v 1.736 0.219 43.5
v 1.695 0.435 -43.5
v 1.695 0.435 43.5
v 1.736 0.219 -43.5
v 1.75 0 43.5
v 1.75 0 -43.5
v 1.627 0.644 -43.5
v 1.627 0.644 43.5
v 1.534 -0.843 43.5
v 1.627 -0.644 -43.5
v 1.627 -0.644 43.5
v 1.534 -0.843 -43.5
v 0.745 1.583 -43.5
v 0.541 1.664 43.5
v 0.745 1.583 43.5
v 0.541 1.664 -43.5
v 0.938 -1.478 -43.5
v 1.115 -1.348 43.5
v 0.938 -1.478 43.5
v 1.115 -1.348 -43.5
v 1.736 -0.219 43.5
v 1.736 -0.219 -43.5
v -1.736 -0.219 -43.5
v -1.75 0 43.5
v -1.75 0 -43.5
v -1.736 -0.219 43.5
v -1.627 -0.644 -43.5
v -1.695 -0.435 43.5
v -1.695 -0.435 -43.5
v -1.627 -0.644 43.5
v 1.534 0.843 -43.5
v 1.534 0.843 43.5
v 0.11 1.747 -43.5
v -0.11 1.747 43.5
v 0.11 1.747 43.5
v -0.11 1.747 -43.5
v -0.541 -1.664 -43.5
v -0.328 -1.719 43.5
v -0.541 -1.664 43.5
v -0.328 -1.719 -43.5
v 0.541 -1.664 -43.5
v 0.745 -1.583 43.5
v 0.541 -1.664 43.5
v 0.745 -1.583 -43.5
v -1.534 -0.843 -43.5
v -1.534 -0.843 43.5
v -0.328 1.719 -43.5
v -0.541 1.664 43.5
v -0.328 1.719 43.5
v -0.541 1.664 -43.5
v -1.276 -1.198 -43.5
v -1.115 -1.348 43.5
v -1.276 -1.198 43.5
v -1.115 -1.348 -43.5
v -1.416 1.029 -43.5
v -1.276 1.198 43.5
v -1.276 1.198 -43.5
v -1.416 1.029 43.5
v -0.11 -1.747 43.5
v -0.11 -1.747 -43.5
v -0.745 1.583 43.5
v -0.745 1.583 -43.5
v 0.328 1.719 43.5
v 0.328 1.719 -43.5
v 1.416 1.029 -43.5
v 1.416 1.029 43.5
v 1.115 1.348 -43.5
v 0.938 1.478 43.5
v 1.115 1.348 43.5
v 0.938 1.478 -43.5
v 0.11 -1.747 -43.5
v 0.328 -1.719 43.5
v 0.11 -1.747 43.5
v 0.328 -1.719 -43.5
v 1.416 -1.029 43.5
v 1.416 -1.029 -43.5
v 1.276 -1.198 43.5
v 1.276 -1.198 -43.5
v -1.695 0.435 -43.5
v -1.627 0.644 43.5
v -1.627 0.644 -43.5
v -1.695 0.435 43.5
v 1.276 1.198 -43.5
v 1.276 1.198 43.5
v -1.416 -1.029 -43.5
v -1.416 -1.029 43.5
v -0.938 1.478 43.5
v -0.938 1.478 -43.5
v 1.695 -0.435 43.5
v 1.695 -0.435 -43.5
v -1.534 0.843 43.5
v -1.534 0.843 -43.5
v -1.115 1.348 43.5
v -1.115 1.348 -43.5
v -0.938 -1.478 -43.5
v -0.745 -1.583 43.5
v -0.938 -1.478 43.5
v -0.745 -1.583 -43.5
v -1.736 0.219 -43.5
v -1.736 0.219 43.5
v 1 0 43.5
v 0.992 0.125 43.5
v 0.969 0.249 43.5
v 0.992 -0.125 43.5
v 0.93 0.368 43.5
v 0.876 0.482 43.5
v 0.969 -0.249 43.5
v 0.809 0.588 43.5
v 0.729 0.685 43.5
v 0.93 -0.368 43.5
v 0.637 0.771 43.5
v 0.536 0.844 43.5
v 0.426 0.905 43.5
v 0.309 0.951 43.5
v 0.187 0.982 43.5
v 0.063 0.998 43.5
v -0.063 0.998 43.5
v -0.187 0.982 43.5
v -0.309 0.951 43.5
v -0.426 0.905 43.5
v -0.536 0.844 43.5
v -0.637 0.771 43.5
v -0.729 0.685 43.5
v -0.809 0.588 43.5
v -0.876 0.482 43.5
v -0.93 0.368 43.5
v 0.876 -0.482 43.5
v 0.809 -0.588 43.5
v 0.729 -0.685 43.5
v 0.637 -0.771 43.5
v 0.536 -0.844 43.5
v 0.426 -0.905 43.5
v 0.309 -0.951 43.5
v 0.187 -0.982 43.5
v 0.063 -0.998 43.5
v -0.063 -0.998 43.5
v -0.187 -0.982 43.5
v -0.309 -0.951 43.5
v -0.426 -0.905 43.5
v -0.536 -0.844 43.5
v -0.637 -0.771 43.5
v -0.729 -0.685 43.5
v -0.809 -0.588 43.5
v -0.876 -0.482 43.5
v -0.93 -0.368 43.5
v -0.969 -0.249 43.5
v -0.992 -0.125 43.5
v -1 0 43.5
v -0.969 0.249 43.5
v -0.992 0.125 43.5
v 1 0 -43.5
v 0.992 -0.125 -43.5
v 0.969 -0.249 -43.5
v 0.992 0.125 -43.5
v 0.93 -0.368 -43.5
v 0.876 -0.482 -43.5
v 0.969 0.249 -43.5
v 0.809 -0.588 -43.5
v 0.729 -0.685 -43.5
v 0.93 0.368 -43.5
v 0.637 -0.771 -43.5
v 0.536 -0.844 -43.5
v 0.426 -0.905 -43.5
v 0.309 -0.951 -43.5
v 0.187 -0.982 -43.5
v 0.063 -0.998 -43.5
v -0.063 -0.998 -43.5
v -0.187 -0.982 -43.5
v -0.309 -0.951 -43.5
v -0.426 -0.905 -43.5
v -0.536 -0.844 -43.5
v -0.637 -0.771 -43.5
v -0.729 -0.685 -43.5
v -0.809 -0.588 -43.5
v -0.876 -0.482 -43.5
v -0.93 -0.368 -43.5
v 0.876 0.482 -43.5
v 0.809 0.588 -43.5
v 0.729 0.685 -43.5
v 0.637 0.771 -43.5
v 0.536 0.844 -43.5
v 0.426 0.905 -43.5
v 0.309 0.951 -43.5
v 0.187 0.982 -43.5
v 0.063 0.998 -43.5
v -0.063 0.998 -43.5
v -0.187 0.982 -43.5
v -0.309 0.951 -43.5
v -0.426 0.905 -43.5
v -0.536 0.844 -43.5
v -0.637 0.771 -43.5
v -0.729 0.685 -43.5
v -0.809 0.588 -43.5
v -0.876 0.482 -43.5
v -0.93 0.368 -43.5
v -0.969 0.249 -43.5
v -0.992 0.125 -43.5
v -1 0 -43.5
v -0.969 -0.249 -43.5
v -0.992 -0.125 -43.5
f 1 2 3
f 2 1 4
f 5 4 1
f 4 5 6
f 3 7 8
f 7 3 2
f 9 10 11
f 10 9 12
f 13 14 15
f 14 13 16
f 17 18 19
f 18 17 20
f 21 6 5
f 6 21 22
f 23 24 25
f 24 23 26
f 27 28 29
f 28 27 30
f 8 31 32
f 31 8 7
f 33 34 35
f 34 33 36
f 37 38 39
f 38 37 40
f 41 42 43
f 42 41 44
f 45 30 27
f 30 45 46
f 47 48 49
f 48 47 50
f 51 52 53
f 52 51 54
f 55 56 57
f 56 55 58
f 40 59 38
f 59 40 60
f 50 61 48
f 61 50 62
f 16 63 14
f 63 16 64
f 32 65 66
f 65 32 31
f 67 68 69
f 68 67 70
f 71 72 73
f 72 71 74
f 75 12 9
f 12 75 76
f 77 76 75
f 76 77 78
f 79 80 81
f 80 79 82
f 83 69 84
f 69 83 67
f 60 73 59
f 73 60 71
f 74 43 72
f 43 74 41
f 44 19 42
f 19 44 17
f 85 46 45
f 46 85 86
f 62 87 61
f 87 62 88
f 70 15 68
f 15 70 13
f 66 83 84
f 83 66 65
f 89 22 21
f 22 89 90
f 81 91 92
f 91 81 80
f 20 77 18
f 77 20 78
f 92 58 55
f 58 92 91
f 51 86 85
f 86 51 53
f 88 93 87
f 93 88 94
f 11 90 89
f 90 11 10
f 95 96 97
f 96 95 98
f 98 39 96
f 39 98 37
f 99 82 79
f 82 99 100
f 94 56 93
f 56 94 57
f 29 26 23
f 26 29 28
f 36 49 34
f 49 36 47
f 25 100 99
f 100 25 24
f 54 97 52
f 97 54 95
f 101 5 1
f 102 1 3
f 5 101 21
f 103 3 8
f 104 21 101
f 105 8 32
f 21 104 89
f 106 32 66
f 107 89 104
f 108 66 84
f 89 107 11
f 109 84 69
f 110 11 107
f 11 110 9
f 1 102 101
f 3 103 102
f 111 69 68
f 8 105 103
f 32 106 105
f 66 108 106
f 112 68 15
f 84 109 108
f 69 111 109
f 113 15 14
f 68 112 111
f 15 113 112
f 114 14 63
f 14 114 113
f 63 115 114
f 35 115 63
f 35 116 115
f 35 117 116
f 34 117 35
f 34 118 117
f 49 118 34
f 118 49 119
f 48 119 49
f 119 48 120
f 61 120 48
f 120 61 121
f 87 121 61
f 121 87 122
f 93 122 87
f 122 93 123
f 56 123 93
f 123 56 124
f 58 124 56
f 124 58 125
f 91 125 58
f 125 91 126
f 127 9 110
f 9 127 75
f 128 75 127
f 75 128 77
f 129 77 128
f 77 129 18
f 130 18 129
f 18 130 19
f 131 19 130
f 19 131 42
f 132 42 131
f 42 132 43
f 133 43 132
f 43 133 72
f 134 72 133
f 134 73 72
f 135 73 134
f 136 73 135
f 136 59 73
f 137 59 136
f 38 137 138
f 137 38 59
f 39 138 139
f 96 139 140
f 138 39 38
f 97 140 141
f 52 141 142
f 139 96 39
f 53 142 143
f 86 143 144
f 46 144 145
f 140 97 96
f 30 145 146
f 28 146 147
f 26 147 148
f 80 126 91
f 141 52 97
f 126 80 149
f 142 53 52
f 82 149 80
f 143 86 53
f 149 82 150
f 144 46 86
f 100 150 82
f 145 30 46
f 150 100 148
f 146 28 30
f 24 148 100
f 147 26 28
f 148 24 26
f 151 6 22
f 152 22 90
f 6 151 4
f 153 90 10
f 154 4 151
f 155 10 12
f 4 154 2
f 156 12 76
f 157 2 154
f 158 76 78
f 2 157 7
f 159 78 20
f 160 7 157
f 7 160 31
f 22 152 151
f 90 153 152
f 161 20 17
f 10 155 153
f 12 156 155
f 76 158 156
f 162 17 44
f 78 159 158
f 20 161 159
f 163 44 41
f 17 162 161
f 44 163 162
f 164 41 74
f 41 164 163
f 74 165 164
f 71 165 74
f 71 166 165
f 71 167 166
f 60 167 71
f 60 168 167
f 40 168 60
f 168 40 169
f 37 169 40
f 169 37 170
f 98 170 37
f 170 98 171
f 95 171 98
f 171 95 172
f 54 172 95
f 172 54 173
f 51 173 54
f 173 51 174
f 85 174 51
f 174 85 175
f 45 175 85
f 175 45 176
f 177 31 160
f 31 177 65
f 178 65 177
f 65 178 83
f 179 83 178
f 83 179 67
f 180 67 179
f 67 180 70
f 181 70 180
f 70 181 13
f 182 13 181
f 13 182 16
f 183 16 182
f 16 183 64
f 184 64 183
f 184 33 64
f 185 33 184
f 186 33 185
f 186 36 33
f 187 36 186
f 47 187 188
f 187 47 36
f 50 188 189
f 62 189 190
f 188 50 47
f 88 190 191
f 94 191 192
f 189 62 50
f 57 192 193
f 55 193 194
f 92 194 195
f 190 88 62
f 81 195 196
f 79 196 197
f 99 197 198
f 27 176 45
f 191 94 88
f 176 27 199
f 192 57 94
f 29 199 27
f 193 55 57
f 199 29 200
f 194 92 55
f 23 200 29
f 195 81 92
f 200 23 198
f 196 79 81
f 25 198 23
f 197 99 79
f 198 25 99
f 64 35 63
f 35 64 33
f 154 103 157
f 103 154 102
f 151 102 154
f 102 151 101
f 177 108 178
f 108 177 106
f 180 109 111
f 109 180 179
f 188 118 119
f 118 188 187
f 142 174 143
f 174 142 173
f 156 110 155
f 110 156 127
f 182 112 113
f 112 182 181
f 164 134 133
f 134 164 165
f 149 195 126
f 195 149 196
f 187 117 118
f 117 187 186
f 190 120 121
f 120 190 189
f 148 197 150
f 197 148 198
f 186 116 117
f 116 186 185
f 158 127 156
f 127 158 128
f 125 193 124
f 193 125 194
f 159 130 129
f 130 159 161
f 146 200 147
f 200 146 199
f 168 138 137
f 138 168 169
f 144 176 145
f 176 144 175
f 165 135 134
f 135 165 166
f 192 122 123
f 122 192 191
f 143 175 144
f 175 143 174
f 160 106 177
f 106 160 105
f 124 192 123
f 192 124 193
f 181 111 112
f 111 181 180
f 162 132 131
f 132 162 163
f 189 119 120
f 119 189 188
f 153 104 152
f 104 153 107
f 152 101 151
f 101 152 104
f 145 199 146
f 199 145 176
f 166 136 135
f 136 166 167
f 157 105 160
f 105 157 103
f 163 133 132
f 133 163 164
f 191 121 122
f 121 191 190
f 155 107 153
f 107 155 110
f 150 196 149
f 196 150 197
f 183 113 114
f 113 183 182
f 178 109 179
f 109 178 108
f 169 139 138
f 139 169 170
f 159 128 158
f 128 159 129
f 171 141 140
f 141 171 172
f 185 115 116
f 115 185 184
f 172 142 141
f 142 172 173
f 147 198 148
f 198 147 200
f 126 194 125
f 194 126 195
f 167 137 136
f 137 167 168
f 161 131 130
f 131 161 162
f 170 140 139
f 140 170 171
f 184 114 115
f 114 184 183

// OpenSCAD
$fn = 50;


difference() {
	union() {
		translate(v = [0, 0, -43.5000000000]) {
			cylinder(h = 87, r = 1.7500000000);
		}
	}
	union() {
		translate(v = [0, 0, -100.0000000000]) {
			cylinder(h = 200, r = 1.0000000000);
		}
	}
}
